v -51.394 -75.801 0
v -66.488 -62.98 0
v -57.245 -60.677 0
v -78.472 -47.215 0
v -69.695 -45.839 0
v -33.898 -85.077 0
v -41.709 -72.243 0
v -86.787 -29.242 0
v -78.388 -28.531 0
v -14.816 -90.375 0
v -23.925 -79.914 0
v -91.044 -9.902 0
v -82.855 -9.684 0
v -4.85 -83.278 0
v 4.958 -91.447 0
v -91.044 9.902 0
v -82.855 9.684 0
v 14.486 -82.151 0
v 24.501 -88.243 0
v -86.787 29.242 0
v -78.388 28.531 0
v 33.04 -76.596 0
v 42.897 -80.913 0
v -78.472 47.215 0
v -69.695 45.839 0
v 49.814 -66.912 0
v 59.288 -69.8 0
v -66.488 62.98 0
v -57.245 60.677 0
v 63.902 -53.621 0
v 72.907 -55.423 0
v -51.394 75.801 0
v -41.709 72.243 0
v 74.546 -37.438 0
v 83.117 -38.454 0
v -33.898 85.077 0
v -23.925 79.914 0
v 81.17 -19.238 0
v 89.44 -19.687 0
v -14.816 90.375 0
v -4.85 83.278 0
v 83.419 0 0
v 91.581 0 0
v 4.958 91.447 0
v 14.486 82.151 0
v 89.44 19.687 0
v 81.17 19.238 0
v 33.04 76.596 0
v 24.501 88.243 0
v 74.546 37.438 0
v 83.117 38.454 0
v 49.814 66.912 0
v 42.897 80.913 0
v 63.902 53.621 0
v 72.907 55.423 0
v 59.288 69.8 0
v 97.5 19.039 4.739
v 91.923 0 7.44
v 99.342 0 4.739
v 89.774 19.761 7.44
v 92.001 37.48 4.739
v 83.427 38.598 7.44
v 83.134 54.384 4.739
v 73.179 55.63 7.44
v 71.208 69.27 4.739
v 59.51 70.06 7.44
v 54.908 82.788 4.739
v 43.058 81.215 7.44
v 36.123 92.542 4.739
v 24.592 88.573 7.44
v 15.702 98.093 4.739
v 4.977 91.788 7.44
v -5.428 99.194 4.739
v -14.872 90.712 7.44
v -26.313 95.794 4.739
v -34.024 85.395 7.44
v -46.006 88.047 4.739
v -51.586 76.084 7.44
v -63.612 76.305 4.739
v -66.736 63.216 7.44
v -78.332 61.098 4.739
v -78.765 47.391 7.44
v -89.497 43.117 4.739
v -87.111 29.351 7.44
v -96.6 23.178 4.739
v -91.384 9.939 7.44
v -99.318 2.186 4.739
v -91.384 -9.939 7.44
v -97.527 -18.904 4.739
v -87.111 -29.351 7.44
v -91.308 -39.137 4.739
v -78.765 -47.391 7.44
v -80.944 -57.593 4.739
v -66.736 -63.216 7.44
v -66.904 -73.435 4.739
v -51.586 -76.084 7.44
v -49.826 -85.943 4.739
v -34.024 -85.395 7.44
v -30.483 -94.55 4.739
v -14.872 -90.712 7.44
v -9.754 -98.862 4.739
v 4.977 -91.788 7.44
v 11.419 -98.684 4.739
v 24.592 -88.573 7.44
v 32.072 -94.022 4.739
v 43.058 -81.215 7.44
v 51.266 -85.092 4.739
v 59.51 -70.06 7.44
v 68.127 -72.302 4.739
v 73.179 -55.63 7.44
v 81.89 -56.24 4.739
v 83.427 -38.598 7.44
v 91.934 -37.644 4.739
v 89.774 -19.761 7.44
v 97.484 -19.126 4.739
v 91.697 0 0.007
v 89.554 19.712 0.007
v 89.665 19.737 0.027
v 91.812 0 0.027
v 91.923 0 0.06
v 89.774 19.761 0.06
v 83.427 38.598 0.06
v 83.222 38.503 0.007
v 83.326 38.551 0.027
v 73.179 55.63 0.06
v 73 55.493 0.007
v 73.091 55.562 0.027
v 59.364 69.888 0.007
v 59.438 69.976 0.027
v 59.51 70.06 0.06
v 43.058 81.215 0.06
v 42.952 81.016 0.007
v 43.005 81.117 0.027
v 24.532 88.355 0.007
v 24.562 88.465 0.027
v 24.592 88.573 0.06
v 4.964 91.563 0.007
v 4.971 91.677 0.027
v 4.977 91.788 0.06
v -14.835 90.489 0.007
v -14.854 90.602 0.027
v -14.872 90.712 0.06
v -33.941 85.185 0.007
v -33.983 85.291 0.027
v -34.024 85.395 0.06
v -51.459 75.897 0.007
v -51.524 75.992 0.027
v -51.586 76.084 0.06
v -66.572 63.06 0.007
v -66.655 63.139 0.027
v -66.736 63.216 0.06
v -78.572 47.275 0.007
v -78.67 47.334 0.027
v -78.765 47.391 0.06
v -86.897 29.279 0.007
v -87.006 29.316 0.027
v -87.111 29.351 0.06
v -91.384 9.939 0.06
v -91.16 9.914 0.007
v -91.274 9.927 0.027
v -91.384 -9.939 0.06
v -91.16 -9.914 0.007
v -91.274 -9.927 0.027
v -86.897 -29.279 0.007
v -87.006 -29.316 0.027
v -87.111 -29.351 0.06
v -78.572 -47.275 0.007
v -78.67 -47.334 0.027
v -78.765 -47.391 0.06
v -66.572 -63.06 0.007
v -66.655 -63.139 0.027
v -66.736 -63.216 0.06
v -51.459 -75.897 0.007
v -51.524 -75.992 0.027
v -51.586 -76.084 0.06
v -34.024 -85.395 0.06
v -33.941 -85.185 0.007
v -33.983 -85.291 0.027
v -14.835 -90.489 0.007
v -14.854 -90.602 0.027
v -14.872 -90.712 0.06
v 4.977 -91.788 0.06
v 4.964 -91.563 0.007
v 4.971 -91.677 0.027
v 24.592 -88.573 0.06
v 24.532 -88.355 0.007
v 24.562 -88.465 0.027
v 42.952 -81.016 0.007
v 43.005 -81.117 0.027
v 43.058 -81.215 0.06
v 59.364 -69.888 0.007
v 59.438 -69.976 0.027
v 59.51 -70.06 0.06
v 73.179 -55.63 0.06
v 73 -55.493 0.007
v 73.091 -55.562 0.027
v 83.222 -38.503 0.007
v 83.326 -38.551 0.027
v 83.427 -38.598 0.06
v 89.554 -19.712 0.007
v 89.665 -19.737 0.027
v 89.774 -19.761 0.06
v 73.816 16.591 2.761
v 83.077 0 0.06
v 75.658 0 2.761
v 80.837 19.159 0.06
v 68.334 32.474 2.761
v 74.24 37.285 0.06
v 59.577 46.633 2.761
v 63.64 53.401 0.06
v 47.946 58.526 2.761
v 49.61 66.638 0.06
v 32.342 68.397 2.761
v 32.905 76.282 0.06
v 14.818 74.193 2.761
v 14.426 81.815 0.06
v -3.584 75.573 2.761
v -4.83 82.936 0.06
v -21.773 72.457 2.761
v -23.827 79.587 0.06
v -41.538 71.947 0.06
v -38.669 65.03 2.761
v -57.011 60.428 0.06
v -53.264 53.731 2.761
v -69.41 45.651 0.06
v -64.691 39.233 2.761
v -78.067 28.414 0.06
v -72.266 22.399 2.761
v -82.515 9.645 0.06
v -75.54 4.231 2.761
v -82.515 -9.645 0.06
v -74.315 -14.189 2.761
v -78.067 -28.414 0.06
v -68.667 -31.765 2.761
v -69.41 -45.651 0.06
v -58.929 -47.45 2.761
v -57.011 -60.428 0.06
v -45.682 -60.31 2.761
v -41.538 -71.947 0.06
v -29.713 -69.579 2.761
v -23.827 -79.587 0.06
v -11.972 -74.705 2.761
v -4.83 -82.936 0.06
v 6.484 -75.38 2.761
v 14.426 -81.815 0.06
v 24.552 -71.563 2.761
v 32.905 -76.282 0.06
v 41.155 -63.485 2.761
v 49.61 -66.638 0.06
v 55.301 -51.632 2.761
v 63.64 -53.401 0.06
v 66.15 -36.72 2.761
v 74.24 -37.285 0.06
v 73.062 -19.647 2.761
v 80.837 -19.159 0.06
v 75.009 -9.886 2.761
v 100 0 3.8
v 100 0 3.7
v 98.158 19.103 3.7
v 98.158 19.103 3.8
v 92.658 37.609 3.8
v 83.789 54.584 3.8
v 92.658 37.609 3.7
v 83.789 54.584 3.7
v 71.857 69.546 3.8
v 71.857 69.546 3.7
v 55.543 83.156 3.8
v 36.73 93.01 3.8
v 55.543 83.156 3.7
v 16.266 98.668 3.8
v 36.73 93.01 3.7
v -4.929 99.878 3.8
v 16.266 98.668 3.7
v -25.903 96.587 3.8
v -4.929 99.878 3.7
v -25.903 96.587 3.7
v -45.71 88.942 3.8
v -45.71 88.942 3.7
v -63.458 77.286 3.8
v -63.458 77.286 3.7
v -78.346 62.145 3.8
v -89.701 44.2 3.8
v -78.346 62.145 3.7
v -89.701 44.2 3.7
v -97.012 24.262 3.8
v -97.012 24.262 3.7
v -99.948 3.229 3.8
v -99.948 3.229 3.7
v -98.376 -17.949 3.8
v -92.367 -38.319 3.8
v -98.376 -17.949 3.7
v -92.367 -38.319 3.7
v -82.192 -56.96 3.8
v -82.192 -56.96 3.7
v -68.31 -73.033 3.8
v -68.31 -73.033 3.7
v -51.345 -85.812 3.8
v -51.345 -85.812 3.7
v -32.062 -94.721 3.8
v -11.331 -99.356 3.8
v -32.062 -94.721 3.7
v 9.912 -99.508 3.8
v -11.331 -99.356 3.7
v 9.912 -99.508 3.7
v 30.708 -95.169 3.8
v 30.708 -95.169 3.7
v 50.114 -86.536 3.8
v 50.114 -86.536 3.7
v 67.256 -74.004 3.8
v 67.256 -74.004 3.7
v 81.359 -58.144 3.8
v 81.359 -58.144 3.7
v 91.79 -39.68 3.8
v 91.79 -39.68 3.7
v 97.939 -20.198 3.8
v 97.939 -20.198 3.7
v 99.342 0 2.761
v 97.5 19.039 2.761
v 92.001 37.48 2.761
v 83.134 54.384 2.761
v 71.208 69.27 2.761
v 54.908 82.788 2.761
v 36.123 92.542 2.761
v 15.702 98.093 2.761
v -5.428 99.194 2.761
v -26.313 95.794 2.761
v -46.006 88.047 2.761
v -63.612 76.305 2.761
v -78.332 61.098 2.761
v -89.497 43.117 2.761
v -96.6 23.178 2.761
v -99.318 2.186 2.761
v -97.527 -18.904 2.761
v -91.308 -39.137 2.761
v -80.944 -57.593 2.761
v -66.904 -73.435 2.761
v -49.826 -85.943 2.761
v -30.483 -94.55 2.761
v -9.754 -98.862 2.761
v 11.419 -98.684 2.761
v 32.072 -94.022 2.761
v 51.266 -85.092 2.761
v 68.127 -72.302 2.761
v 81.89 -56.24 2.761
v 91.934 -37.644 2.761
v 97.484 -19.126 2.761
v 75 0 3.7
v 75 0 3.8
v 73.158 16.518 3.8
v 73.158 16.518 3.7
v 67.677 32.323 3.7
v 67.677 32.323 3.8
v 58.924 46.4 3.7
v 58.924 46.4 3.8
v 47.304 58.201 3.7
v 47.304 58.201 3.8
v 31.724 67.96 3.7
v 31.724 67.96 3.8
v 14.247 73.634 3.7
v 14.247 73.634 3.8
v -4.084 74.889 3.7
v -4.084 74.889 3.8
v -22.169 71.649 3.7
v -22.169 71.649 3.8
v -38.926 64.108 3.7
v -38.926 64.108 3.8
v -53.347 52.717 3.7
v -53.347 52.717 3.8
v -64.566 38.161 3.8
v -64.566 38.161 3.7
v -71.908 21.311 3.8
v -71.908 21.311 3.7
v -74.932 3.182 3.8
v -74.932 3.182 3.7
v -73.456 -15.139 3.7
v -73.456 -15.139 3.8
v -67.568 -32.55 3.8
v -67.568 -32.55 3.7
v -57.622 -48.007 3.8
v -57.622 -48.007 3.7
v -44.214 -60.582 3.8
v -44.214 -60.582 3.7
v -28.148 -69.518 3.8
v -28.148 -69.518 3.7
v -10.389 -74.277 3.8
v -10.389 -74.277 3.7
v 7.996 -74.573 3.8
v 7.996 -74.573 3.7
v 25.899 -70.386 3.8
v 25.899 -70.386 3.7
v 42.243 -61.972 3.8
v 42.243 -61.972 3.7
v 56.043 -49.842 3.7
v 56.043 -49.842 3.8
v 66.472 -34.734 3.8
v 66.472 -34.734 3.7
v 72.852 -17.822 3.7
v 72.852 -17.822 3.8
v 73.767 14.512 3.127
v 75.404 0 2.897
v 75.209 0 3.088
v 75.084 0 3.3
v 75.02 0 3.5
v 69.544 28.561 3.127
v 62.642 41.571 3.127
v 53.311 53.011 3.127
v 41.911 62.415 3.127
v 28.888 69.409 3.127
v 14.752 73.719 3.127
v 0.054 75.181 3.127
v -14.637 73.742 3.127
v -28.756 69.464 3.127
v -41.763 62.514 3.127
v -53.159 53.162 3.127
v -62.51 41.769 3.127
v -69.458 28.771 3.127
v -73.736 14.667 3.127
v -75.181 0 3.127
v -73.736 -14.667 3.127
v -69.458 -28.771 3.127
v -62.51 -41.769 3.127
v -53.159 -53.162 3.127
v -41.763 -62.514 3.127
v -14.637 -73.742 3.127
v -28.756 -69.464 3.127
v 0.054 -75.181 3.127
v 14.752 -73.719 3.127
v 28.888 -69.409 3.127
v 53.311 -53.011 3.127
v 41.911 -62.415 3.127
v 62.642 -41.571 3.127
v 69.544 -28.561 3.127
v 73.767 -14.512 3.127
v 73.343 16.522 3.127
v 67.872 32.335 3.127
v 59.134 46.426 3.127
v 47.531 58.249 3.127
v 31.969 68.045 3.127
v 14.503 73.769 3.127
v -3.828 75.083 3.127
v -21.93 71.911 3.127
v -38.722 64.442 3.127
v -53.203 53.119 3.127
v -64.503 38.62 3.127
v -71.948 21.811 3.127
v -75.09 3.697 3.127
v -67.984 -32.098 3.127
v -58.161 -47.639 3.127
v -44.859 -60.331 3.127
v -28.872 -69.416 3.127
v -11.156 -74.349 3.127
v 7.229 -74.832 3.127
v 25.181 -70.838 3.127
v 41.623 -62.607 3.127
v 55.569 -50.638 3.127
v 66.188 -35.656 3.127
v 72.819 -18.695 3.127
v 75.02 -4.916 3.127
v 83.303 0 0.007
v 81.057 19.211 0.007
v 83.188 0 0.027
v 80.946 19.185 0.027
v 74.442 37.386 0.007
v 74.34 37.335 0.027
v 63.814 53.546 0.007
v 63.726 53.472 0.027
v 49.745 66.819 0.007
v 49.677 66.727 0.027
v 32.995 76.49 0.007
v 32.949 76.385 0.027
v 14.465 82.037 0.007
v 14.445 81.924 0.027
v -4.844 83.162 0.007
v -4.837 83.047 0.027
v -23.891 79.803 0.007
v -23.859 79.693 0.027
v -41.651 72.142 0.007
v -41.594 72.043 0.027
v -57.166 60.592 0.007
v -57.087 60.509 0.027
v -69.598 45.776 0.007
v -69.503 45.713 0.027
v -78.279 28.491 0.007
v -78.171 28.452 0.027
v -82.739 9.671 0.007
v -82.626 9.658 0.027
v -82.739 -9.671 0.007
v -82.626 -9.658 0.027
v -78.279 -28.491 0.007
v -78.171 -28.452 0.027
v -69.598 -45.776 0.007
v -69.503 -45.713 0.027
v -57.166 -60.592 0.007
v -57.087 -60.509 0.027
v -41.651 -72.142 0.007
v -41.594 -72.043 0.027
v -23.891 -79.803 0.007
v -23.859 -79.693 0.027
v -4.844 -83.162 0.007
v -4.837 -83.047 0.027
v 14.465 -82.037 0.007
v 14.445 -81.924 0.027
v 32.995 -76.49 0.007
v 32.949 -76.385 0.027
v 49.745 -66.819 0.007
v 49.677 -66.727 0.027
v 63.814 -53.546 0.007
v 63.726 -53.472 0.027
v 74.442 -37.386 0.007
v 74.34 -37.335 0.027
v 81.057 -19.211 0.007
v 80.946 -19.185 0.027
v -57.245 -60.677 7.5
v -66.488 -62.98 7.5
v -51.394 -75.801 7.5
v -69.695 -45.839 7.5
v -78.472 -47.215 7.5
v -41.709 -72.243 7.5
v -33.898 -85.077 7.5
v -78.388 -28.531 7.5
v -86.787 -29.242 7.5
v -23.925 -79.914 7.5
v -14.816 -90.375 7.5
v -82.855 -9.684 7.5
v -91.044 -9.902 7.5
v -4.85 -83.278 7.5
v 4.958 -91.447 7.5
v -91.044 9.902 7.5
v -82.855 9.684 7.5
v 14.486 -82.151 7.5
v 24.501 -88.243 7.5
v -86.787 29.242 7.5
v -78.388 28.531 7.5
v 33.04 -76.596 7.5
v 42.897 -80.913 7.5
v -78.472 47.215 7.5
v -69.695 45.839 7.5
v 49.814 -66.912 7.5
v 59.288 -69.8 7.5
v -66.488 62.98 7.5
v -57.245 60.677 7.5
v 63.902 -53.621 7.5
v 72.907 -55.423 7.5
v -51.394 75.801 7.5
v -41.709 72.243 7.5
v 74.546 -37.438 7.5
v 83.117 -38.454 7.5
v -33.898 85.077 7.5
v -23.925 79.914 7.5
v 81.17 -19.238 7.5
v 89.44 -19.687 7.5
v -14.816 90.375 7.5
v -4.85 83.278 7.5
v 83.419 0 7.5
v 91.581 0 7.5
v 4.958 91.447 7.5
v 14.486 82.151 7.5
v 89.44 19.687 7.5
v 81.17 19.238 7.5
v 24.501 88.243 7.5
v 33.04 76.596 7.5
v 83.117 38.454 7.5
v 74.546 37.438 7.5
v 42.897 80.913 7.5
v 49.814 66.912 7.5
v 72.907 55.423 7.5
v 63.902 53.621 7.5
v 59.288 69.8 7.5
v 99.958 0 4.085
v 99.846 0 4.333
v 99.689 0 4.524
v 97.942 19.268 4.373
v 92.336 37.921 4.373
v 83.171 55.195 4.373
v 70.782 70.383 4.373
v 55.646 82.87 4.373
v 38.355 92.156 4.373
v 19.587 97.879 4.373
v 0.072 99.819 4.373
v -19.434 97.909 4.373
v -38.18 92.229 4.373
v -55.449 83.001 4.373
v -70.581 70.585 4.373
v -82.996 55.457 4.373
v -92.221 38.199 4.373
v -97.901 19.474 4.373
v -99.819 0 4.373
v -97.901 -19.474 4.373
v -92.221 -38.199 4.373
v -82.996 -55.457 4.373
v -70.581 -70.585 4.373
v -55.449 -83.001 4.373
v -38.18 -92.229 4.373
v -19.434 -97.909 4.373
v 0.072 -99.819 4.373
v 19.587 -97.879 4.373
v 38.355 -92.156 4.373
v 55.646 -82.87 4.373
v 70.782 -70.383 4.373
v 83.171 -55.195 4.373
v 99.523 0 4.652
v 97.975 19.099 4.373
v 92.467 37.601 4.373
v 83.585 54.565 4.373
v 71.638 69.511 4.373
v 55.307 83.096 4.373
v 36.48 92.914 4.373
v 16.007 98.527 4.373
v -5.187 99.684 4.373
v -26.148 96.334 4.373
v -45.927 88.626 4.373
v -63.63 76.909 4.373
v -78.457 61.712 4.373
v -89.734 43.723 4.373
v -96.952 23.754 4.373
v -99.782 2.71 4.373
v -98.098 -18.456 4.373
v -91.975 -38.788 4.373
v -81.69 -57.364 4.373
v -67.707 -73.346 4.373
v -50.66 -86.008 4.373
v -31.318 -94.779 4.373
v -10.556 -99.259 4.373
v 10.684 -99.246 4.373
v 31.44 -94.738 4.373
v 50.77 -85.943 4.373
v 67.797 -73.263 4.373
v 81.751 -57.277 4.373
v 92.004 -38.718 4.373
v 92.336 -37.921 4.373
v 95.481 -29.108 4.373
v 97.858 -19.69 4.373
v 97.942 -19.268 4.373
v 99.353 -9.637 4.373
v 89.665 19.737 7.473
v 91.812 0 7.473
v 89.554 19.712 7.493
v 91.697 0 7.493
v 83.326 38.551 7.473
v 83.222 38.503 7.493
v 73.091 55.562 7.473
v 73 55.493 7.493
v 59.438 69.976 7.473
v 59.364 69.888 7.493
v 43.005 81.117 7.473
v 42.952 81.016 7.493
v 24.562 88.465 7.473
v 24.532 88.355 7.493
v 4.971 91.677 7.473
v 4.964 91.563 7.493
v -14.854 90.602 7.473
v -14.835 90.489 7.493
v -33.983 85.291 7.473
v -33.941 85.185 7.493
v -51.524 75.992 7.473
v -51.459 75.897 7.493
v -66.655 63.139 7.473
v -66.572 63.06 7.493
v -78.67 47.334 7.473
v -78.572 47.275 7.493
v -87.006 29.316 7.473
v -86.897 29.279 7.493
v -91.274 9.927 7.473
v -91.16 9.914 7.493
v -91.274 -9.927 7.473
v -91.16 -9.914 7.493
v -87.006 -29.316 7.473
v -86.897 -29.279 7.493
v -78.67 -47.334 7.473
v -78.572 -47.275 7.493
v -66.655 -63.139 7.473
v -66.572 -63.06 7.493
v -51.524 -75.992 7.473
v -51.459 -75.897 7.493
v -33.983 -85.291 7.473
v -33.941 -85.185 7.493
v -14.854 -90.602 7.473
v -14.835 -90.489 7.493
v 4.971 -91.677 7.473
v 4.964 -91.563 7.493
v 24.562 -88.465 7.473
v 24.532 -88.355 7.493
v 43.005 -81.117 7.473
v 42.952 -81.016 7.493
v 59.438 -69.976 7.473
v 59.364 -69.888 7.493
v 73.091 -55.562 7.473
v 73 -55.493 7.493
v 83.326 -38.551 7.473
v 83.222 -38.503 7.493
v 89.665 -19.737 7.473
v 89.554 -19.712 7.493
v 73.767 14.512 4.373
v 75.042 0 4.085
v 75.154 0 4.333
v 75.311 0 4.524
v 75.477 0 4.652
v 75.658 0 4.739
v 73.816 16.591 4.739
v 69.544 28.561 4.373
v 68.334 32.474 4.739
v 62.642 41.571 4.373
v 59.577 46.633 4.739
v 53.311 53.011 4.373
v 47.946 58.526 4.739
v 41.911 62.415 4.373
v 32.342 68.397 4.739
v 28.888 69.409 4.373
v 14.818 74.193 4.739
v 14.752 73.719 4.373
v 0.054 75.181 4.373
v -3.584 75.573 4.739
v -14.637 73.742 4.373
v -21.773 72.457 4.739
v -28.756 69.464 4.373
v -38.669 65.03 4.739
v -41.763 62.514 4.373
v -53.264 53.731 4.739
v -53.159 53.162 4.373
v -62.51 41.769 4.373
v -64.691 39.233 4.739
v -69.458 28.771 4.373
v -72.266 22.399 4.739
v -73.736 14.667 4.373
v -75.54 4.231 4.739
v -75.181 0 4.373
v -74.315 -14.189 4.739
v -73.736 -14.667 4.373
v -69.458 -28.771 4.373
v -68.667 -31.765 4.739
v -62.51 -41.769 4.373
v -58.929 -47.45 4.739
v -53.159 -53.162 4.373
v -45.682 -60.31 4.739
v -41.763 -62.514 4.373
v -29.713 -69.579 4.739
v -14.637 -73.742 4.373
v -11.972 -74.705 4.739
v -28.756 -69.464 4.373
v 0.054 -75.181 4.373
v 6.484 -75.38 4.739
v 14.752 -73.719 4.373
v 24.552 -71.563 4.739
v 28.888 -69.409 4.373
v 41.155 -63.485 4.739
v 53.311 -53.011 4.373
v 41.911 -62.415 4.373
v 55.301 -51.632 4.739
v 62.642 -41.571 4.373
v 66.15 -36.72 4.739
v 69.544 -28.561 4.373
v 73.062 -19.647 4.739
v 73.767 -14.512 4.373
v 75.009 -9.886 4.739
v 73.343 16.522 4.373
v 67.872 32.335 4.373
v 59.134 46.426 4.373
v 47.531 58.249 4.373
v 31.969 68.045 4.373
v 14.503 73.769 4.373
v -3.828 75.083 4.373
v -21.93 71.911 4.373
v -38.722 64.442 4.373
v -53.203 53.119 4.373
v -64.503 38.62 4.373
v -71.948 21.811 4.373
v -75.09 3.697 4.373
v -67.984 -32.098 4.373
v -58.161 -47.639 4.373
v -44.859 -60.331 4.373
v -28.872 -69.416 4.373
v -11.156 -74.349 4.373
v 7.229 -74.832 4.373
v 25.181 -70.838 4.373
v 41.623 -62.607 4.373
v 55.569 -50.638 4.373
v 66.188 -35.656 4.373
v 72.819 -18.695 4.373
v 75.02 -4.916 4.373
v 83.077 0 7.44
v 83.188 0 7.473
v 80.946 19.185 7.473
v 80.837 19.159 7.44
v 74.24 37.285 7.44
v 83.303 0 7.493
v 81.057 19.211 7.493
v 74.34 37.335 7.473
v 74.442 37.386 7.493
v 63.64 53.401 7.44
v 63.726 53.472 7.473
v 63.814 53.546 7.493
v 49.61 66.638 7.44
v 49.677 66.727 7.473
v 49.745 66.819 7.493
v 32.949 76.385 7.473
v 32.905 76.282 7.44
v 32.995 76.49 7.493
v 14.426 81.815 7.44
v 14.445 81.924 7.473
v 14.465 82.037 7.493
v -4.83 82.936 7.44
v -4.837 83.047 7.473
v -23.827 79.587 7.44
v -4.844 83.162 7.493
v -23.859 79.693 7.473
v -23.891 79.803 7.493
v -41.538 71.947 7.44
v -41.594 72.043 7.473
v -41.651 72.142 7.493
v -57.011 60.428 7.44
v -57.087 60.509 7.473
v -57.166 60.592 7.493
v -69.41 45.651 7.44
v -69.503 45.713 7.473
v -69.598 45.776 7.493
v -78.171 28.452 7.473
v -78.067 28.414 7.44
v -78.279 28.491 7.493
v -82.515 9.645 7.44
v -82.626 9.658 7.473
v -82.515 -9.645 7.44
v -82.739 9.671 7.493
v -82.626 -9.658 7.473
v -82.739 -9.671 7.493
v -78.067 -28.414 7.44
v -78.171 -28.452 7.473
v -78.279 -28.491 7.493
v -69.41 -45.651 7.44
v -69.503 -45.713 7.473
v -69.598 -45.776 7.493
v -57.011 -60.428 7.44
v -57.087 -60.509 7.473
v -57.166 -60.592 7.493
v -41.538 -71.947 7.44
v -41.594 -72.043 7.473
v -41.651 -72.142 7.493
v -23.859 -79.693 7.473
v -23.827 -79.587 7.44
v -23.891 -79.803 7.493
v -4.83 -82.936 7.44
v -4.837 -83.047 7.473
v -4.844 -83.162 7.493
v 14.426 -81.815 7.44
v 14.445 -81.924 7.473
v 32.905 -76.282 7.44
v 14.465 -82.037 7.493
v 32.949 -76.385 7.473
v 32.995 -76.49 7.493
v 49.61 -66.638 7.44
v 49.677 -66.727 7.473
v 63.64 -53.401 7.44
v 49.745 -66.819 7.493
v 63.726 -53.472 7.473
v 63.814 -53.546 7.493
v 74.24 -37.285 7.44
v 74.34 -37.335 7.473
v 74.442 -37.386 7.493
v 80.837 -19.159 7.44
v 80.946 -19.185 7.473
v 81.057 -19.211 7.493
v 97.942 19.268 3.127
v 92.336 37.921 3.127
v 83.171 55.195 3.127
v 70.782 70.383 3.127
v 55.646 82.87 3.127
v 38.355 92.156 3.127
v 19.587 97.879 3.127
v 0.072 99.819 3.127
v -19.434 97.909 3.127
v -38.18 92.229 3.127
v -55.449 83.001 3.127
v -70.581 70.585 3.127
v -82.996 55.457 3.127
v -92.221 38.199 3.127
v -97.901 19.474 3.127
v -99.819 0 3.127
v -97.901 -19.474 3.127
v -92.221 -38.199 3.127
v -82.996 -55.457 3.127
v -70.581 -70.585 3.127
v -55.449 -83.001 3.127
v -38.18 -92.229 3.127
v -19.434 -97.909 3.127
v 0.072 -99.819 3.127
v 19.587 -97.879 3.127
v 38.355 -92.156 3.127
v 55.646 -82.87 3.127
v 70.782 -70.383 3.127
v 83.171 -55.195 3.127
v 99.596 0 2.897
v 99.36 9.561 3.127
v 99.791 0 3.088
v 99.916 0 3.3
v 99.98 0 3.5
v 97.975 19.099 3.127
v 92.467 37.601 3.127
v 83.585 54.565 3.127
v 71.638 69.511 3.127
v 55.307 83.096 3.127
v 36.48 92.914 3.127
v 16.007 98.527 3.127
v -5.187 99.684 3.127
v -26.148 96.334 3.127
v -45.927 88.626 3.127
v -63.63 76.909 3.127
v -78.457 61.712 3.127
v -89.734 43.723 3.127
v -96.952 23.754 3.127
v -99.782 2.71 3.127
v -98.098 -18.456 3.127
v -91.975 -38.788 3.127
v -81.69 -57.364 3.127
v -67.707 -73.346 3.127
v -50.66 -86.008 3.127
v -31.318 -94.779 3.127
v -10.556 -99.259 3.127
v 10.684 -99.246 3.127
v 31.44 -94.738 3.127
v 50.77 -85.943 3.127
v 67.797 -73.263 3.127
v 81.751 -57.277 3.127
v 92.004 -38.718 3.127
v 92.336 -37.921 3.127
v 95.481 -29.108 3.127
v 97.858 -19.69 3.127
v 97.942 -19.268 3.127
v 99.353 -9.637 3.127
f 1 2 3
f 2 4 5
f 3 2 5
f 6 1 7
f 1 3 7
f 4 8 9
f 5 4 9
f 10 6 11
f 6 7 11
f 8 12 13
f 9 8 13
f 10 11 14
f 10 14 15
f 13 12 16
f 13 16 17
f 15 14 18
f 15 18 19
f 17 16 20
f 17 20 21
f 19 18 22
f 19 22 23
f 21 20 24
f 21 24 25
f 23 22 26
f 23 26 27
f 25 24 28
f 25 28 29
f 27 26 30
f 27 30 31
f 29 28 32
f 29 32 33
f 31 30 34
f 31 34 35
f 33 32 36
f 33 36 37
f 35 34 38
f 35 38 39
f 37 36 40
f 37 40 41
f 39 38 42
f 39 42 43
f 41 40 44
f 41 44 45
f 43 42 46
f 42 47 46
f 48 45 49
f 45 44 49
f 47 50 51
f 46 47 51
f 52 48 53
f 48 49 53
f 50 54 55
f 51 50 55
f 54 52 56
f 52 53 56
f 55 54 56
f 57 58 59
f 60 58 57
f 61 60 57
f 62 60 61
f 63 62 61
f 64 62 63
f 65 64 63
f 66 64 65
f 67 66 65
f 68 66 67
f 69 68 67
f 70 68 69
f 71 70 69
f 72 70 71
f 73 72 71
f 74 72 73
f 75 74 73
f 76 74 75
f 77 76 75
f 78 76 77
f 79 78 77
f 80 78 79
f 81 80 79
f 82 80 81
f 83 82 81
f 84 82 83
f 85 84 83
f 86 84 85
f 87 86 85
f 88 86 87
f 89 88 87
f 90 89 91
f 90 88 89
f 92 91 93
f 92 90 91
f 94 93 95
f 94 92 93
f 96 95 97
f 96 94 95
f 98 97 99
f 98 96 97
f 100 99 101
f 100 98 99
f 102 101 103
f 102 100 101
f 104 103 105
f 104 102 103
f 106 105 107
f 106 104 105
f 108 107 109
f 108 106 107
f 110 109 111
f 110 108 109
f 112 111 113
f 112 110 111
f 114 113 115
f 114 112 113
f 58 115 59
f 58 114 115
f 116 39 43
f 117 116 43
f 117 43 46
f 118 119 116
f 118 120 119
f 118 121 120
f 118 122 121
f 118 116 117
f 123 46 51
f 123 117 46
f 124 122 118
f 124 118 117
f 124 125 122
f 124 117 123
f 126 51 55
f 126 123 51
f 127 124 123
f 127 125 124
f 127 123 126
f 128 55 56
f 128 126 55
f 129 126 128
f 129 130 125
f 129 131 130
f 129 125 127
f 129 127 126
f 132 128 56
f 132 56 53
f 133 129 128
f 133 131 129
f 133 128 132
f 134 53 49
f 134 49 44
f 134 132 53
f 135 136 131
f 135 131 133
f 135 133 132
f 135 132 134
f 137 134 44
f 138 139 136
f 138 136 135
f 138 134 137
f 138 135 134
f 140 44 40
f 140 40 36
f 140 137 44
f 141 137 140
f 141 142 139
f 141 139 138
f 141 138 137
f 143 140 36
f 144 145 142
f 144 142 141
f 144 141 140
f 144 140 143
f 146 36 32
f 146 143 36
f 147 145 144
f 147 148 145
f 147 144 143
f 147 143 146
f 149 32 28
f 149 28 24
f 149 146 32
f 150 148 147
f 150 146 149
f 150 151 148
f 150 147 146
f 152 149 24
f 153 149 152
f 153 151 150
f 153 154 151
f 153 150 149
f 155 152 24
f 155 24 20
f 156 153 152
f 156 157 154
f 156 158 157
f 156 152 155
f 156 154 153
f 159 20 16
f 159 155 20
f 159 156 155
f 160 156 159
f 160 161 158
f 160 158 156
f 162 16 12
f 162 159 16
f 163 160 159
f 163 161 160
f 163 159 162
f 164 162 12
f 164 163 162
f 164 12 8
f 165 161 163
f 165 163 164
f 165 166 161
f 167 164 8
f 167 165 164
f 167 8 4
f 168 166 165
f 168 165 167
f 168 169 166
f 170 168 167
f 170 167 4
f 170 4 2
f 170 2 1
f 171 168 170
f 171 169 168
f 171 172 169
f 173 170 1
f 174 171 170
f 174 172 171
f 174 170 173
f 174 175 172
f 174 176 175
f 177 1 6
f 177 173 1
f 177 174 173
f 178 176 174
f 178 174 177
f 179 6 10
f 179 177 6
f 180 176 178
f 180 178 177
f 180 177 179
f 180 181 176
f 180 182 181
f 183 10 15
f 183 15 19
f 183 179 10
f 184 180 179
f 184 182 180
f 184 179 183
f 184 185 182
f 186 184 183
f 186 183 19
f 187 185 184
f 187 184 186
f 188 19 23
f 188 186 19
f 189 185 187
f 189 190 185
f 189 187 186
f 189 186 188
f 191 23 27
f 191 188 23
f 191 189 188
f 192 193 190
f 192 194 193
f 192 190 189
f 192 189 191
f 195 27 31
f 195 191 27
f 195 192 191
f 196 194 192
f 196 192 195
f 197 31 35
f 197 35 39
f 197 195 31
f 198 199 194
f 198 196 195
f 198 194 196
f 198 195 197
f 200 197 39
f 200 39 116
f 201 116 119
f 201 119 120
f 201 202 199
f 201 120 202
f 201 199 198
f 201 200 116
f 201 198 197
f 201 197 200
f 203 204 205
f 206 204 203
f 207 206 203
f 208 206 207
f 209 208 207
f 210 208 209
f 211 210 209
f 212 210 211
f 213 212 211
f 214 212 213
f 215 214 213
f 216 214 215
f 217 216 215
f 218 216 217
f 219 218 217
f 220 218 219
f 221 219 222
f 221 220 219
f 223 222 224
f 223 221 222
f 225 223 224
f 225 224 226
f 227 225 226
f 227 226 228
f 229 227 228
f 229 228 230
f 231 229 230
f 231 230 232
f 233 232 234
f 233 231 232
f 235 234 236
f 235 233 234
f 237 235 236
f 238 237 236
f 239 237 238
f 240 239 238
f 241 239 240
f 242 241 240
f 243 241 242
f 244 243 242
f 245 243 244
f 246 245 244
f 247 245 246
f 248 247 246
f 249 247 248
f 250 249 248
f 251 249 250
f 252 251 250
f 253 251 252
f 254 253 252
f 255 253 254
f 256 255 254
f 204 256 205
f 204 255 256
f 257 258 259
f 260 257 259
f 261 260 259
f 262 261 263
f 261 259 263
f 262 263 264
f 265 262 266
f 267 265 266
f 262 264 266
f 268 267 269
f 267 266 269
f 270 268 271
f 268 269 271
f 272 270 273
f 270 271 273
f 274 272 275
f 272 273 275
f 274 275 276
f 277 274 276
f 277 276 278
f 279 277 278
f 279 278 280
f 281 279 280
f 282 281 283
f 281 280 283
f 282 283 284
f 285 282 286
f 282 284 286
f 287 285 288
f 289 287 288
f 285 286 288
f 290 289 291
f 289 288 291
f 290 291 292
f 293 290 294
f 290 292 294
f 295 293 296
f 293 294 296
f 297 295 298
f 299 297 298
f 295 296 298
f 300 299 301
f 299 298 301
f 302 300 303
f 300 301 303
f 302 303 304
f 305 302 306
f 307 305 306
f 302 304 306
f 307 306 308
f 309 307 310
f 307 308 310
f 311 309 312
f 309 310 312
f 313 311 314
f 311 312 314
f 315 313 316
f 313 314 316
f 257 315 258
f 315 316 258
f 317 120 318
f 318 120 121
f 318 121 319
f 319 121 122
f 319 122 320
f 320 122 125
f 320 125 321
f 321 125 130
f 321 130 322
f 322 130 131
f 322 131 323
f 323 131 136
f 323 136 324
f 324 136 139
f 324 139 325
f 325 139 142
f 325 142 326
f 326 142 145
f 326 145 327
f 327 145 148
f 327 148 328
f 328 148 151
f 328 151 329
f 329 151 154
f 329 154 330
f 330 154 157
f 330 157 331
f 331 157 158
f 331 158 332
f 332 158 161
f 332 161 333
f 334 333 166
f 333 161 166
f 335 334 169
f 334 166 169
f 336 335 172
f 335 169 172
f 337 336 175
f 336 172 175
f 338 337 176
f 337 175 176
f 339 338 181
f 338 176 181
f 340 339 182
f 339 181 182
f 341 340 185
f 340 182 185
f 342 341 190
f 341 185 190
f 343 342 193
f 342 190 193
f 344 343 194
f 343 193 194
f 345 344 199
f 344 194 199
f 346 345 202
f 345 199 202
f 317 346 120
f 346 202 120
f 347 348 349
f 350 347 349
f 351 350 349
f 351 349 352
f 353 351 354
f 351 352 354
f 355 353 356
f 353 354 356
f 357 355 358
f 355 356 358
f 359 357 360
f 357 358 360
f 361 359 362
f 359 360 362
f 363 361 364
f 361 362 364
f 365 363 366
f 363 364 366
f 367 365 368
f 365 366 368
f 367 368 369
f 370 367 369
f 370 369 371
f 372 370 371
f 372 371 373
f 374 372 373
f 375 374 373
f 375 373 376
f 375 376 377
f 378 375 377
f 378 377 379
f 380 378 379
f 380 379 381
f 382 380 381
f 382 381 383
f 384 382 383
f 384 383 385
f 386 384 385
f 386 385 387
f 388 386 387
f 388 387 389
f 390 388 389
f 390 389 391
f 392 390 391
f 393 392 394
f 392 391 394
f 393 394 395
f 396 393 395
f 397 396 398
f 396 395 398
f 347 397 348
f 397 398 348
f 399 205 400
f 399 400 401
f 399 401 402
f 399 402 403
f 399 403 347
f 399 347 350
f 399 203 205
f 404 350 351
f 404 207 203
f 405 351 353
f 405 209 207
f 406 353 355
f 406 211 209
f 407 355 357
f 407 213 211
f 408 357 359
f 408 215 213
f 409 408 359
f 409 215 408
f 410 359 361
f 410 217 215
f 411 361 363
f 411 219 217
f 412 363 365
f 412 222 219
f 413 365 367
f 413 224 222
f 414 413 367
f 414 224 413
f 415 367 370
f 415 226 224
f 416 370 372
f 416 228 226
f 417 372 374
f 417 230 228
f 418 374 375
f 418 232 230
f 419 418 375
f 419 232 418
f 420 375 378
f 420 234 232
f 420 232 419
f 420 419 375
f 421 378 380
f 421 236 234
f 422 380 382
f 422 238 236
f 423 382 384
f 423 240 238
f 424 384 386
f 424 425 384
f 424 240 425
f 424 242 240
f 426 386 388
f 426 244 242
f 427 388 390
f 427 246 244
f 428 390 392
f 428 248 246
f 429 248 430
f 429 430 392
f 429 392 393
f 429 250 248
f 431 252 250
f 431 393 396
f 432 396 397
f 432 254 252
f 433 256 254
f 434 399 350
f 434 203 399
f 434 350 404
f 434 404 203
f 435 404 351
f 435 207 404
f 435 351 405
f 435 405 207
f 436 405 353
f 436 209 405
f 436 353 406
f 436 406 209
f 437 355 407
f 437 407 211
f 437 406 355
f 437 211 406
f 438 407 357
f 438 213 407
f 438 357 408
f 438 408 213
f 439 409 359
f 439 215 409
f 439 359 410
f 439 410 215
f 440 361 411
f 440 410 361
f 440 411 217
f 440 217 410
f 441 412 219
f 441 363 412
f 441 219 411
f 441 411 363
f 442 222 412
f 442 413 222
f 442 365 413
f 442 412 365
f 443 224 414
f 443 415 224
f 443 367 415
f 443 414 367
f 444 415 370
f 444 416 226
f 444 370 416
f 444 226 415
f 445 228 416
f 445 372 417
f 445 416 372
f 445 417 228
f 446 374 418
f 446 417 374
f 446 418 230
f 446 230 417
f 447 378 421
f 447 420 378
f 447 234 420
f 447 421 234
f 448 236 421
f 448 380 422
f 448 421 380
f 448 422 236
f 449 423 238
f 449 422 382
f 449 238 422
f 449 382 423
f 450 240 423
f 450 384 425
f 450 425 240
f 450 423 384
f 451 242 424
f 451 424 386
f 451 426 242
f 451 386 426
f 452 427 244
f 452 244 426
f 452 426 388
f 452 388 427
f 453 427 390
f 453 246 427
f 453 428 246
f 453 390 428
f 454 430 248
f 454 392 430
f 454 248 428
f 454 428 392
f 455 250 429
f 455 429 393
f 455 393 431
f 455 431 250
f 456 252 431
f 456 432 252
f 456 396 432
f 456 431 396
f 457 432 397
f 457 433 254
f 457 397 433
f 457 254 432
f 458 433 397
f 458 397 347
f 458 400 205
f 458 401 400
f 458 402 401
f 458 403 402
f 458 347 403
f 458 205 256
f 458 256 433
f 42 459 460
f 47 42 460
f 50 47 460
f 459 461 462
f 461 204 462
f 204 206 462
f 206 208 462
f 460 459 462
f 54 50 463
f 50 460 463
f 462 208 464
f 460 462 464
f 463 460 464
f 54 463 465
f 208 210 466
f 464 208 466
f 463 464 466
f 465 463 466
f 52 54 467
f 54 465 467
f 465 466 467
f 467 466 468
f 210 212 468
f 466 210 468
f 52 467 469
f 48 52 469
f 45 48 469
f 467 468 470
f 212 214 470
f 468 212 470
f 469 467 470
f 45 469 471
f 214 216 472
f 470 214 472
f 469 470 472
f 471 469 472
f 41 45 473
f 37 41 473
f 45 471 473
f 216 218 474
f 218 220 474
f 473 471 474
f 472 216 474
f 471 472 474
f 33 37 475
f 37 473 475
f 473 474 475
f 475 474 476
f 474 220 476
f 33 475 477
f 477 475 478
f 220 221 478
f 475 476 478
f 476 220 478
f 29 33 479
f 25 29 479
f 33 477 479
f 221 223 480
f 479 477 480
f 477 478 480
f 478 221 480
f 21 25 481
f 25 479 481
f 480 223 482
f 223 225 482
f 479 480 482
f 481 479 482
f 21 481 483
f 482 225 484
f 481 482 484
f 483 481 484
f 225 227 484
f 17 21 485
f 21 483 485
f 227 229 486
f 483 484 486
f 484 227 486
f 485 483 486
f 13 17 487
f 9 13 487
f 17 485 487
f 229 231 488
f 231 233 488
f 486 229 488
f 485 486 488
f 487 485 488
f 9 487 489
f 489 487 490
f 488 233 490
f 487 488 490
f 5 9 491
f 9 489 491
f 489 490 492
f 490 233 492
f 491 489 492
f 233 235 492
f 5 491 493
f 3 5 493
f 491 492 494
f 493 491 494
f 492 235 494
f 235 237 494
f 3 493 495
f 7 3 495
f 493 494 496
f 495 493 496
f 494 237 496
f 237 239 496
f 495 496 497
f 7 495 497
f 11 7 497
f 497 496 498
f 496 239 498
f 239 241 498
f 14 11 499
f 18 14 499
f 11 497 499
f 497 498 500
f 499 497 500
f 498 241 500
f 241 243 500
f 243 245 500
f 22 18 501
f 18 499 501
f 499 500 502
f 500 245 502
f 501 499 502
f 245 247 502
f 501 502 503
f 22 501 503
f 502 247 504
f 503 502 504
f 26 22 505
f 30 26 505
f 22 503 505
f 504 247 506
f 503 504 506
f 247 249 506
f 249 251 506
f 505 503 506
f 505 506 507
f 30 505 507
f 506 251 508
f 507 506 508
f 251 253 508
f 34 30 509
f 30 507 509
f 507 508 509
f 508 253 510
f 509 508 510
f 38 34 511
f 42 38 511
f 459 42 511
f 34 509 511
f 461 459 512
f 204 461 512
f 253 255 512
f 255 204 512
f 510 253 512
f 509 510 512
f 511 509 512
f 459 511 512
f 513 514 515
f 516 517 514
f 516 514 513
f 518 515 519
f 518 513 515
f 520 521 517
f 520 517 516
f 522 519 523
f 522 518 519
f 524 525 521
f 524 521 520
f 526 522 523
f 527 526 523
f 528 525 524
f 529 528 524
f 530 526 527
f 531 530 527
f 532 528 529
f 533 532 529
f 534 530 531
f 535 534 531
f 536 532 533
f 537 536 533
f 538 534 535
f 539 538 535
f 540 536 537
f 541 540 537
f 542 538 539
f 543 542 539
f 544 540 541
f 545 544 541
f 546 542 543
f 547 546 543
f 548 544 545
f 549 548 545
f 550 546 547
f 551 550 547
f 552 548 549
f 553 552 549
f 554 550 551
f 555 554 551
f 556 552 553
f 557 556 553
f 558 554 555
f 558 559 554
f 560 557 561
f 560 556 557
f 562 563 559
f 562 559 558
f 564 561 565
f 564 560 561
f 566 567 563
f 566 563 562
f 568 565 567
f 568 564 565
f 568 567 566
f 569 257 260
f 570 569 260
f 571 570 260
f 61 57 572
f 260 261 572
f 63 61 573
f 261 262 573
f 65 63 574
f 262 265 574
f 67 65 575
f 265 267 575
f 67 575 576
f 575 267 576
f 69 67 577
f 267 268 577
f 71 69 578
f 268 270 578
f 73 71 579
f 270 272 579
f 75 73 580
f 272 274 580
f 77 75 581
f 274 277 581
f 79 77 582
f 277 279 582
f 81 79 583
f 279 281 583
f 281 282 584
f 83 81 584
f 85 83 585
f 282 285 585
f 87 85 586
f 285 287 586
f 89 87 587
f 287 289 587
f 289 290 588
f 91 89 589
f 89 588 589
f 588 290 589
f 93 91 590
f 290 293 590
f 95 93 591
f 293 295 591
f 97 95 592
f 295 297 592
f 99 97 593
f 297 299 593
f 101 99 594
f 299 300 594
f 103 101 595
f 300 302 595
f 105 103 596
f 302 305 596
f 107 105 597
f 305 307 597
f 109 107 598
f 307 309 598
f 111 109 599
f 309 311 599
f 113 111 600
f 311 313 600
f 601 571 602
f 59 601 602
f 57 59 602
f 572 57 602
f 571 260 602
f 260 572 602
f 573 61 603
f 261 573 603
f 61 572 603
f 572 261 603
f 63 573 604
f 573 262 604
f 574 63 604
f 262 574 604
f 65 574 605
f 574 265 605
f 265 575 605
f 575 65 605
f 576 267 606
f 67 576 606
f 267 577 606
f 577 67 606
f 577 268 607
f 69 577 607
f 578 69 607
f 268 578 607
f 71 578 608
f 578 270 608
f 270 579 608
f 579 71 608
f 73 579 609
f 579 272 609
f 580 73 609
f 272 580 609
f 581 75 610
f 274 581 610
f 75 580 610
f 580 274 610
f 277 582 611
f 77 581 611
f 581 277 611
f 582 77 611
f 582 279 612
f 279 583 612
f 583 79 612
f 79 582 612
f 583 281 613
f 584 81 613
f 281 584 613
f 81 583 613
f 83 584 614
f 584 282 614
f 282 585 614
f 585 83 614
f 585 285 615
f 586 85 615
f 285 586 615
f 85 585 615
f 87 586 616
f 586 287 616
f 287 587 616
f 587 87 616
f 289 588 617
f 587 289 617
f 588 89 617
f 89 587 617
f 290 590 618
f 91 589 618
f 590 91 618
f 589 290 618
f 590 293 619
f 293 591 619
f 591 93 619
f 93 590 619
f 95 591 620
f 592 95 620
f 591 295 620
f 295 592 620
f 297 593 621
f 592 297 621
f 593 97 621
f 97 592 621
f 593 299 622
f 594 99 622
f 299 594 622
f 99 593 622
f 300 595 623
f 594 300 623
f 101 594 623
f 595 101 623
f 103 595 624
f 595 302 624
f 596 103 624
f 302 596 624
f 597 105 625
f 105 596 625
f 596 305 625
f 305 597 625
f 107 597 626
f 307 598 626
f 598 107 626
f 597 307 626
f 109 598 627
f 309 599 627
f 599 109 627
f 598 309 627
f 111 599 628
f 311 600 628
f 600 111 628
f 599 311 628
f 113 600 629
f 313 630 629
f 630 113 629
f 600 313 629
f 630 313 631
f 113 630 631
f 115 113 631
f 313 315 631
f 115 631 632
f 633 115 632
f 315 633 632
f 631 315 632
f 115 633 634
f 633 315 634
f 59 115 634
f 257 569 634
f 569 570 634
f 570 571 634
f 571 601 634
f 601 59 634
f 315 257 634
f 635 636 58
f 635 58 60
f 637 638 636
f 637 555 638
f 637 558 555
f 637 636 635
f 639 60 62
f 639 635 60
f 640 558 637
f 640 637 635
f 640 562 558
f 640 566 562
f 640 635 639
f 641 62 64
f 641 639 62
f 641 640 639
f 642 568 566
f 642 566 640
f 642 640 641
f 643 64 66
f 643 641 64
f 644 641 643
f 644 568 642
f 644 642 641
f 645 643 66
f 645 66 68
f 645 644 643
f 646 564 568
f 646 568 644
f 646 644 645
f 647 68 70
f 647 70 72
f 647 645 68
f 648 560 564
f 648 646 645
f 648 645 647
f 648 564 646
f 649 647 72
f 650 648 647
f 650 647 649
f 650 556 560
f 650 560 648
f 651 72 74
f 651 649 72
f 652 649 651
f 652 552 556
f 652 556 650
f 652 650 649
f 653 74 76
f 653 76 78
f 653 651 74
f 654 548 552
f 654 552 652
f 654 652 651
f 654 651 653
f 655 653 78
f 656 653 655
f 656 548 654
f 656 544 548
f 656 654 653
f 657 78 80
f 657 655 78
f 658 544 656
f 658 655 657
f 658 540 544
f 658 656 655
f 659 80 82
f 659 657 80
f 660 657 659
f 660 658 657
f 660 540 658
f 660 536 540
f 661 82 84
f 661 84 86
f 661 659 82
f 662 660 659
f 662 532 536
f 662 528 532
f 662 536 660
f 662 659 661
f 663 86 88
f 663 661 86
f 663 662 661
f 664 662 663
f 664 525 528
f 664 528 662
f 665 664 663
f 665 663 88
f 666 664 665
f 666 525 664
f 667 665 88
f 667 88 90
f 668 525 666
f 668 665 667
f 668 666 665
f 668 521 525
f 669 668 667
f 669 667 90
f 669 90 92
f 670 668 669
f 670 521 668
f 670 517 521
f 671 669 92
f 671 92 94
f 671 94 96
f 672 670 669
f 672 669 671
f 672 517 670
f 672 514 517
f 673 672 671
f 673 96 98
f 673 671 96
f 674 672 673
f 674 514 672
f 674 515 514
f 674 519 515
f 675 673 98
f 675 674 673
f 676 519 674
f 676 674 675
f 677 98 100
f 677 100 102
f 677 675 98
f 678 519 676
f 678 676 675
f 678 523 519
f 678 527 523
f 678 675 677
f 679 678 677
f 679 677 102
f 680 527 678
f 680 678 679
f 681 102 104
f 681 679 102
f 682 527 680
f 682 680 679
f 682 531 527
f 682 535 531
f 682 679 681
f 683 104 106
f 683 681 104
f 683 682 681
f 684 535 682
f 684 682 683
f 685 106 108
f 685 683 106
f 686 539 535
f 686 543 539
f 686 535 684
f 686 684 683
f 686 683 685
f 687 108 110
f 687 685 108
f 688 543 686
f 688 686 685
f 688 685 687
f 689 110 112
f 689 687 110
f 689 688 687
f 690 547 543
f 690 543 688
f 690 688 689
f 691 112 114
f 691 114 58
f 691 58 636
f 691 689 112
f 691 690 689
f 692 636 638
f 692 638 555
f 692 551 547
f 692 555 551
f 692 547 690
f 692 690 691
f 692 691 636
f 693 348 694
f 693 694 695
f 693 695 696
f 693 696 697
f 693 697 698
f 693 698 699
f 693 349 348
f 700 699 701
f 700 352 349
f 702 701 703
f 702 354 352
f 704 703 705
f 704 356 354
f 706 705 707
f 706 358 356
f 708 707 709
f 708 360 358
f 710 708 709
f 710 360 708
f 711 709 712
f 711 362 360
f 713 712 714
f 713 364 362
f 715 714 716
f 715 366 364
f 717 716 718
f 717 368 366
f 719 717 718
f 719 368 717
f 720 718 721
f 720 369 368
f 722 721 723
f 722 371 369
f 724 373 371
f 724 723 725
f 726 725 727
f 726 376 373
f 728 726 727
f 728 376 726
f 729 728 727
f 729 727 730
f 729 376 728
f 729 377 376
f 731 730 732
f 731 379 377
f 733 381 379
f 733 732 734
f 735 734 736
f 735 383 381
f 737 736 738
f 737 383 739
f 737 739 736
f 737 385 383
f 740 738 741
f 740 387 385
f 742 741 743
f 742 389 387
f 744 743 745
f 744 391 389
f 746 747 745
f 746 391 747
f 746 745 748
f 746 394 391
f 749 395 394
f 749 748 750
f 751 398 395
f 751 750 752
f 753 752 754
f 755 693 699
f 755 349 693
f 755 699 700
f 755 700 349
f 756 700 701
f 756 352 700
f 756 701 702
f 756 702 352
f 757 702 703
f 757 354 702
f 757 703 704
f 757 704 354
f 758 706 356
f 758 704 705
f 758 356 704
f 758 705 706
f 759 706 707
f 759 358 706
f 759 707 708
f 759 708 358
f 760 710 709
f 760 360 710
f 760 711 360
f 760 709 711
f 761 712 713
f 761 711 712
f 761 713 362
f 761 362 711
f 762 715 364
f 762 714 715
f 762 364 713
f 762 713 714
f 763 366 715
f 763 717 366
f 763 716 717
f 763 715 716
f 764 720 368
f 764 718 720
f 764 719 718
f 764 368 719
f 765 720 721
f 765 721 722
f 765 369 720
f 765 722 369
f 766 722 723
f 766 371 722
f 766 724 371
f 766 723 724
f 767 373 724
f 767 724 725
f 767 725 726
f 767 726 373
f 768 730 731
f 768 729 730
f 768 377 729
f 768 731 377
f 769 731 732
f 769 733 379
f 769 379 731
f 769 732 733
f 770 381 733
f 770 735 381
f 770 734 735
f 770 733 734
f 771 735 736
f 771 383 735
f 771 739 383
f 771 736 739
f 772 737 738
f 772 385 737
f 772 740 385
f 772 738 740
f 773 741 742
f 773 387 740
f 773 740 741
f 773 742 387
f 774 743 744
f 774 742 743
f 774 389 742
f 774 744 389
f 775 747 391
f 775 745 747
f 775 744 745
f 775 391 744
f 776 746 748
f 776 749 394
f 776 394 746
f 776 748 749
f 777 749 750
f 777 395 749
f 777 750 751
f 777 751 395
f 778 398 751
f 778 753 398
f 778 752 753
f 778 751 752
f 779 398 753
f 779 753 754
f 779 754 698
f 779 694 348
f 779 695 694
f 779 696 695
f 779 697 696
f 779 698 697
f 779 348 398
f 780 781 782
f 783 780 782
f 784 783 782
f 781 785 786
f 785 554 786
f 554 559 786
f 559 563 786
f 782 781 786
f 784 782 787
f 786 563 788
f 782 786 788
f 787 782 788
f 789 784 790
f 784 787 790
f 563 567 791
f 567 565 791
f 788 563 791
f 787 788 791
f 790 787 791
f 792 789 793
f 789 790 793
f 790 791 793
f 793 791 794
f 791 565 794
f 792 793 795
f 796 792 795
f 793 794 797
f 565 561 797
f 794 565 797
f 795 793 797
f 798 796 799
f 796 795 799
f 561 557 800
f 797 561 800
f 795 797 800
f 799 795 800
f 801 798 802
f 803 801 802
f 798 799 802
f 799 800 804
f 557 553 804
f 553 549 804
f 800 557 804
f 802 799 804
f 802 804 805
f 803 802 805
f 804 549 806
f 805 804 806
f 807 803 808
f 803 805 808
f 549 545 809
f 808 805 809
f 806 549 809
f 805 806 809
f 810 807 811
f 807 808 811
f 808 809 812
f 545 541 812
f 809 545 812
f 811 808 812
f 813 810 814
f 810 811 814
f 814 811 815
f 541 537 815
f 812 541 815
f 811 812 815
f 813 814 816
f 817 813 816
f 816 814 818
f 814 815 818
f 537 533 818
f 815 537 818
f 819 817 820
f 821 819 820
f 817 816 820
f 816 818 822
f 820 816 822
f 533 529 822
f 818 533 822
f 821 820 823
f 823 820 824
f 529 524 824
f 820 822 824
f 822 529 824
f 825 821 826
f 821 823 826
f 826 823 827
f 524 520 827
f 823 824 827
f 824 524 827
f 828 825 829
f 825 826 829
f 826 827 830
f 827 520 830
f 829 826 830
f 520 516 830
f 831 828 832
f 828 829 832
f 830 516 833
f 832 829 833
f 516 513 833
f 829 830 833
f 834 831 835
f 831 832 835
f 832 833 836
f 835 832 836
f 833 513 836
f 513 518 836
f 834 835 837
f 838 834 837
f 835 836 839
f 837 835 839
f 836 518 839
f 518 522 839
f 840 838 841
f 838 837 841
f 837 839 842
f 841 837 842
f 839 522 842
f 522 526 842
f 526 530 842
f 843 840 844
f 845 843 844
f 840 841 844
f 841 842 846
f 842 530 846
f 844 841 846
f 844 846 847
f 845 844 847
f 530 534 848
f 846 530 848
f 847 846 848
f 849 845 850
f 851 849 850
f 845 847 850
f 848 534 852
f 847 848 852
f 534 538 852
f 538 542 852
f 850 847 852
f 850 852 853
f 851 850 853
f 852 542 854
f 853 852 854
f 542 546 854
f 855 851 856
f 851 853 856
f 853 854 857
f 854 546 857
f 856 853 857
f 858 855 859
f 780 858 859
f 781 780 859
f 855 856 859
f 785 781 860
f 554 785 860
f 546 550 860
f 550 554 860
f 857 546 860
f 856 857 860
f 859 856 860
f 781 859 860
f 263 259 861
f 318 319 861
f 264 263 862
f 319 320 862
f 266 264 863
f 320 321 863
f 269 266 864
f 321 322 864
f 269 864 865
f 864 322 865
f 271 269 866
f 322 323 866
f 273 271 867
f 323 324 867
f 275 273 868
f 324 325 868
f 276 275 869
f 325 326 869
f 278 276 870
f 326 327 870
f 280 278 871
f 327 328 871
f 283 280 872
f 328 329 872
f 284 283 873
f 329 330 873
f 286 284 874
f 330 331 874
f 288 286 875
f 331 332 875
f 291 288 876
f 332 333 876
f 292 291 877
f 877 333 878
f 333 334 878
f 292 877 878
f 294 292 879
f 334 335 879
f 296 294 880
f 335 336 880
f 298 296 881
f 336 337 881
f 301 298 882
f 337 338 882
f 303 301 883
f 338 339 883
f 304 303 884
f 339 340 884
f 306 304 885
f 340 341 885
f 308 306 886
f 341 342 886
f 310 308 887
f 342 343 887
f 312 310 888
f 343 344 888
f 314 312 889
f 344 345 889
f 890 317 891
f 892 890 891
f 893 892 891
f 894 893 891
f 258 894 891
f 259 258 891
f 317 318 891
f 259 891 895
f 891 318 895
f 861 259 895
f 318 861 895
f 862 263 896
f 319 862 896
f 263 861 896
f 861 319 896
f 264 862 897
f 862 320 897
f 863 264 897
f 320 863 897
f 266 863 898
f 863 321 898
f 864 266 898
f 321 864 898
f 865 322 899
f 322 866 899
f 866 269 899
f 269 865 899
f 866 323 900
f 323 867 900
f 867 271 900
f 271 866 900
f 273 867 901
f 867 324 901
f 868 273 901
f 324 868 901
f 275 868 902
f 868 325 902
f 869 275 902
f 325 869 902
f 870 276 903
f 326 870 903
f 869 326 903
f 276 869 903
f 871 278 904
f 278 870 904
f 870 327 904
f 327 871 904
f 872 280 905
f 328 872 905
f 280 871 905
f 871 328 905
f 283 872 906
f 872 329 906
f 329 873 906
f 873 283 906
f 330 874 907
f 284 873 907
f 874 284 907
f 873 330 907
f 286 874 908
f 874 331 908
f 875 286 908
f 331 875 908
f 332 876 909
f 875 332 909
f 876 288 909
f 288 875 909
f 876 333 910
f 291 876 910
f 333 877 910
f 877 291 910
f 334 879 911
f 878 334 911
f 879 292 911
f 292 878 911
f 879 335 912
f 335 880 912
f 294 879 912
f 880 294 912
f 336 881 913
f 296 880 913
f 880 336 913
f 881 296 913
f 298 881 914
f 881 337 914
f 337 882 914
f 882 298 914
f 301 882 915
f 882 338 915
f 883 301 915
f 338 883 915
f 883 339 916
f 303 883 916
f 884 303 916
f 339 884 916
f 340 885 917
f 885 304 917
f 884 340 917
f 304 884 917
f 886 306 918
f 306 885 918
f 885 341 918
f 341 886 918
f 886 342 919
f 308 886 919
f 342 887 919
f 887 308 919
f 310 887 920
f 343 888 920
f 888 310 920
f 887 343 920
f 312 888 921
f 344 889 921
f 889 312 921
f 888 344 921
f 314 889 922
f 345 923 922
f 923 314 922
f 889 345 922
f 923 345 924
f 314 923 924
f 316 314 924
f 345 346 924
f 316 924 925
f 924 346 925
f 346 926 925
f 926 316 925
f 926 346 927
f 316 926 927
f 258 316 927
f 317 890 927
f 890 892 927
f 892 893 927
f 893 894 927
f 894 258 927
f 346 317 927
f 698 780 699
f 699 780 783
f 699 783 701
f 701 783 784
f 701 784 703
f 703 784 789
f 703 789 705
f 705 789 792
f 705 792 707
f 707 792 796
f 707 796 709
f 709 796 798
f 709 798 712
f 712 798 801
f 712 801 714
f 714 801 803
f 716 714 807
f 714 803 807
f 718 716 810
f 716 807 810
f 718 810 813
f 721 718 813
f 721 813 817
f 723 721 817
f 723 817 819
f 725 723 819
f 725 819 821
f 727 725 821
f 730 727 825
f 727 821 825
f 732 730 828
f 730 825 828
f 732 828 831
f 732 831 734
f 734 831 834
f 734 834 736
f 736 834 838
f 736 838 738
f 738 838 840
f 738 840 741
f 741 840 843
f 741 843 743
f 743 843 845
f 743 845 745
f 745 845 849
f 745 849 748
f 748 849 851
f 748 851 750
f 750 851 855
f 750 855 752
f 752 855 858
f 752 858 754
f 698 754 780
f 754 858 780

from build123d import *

# Parameters (mm, degrees)
F0_R       = 100
F1_DEPTH   = 7.5
F2_R       = 75
F3_DEPTH   = 25
F4_SIZE2   = 8.2424322584
F4_SIZE    = 3
F4_2_SIZE2 = 8.2424322584
F4_2_SIZE  = 3
F5_R       = 1


with BuildPart() as f1:
    # F0 (on Top) → F1 (new body)
    with BuildSketch(Plane.XY):
        Circle(F0_R)
    extrude(amount=F1_DEPTH)

    # F2 (on face) → F3 (cut)
    with BuildSketch(Plane.XY.offset(7.5)):
        Circle(F2_R)
    extrude(amount=-F3_DEPTH, mode=Mode.SUBTRACT)

    # F4
    f4_edges = [f1.edges().sort_by_distance(p)[0] for p in [
        (-100, 0, 0),
        (-100, 0, 7.5),
    ]]
    f4_side = f1.faces().sort_by_distance((-100, 0, 3.75))[0]
    chamfer(f4_edges, length=F4_SIZE, length2=F4_SIZE2, reference=f4_side)

    # F4#2
    f4_2_edges = [f1.edges().sort_by_distance(p)[0] for p in [
        (-75, 0, 0),
        (-75, 0, 7.5),
    ]]
    f4_2_side = f1.faces().sort_by_distance((-75, 0, 3.75))[0]
    chamfer(f4_2_edges, length=F4_2_SIZE, length2=F4_2_SIZE2, reference=f4_2_side)

    # F5
    f5_edges = [f1.edges().sort_by_distance(p)[0] for p in [
        (-100, 0, 3),
        (-100, 0, 4.5),
        (-91.757568, 0, 0),
        (-83.242432, 0, 0),
        (-75, 0, 3),
        (-75, 0, 4.5),
        (-91.757568, 0, 7.5),
        (-83.242432, 0, 7.5),
    ]]
    fillet(f5_edges, radius=F5_R)


solid = f1.part
